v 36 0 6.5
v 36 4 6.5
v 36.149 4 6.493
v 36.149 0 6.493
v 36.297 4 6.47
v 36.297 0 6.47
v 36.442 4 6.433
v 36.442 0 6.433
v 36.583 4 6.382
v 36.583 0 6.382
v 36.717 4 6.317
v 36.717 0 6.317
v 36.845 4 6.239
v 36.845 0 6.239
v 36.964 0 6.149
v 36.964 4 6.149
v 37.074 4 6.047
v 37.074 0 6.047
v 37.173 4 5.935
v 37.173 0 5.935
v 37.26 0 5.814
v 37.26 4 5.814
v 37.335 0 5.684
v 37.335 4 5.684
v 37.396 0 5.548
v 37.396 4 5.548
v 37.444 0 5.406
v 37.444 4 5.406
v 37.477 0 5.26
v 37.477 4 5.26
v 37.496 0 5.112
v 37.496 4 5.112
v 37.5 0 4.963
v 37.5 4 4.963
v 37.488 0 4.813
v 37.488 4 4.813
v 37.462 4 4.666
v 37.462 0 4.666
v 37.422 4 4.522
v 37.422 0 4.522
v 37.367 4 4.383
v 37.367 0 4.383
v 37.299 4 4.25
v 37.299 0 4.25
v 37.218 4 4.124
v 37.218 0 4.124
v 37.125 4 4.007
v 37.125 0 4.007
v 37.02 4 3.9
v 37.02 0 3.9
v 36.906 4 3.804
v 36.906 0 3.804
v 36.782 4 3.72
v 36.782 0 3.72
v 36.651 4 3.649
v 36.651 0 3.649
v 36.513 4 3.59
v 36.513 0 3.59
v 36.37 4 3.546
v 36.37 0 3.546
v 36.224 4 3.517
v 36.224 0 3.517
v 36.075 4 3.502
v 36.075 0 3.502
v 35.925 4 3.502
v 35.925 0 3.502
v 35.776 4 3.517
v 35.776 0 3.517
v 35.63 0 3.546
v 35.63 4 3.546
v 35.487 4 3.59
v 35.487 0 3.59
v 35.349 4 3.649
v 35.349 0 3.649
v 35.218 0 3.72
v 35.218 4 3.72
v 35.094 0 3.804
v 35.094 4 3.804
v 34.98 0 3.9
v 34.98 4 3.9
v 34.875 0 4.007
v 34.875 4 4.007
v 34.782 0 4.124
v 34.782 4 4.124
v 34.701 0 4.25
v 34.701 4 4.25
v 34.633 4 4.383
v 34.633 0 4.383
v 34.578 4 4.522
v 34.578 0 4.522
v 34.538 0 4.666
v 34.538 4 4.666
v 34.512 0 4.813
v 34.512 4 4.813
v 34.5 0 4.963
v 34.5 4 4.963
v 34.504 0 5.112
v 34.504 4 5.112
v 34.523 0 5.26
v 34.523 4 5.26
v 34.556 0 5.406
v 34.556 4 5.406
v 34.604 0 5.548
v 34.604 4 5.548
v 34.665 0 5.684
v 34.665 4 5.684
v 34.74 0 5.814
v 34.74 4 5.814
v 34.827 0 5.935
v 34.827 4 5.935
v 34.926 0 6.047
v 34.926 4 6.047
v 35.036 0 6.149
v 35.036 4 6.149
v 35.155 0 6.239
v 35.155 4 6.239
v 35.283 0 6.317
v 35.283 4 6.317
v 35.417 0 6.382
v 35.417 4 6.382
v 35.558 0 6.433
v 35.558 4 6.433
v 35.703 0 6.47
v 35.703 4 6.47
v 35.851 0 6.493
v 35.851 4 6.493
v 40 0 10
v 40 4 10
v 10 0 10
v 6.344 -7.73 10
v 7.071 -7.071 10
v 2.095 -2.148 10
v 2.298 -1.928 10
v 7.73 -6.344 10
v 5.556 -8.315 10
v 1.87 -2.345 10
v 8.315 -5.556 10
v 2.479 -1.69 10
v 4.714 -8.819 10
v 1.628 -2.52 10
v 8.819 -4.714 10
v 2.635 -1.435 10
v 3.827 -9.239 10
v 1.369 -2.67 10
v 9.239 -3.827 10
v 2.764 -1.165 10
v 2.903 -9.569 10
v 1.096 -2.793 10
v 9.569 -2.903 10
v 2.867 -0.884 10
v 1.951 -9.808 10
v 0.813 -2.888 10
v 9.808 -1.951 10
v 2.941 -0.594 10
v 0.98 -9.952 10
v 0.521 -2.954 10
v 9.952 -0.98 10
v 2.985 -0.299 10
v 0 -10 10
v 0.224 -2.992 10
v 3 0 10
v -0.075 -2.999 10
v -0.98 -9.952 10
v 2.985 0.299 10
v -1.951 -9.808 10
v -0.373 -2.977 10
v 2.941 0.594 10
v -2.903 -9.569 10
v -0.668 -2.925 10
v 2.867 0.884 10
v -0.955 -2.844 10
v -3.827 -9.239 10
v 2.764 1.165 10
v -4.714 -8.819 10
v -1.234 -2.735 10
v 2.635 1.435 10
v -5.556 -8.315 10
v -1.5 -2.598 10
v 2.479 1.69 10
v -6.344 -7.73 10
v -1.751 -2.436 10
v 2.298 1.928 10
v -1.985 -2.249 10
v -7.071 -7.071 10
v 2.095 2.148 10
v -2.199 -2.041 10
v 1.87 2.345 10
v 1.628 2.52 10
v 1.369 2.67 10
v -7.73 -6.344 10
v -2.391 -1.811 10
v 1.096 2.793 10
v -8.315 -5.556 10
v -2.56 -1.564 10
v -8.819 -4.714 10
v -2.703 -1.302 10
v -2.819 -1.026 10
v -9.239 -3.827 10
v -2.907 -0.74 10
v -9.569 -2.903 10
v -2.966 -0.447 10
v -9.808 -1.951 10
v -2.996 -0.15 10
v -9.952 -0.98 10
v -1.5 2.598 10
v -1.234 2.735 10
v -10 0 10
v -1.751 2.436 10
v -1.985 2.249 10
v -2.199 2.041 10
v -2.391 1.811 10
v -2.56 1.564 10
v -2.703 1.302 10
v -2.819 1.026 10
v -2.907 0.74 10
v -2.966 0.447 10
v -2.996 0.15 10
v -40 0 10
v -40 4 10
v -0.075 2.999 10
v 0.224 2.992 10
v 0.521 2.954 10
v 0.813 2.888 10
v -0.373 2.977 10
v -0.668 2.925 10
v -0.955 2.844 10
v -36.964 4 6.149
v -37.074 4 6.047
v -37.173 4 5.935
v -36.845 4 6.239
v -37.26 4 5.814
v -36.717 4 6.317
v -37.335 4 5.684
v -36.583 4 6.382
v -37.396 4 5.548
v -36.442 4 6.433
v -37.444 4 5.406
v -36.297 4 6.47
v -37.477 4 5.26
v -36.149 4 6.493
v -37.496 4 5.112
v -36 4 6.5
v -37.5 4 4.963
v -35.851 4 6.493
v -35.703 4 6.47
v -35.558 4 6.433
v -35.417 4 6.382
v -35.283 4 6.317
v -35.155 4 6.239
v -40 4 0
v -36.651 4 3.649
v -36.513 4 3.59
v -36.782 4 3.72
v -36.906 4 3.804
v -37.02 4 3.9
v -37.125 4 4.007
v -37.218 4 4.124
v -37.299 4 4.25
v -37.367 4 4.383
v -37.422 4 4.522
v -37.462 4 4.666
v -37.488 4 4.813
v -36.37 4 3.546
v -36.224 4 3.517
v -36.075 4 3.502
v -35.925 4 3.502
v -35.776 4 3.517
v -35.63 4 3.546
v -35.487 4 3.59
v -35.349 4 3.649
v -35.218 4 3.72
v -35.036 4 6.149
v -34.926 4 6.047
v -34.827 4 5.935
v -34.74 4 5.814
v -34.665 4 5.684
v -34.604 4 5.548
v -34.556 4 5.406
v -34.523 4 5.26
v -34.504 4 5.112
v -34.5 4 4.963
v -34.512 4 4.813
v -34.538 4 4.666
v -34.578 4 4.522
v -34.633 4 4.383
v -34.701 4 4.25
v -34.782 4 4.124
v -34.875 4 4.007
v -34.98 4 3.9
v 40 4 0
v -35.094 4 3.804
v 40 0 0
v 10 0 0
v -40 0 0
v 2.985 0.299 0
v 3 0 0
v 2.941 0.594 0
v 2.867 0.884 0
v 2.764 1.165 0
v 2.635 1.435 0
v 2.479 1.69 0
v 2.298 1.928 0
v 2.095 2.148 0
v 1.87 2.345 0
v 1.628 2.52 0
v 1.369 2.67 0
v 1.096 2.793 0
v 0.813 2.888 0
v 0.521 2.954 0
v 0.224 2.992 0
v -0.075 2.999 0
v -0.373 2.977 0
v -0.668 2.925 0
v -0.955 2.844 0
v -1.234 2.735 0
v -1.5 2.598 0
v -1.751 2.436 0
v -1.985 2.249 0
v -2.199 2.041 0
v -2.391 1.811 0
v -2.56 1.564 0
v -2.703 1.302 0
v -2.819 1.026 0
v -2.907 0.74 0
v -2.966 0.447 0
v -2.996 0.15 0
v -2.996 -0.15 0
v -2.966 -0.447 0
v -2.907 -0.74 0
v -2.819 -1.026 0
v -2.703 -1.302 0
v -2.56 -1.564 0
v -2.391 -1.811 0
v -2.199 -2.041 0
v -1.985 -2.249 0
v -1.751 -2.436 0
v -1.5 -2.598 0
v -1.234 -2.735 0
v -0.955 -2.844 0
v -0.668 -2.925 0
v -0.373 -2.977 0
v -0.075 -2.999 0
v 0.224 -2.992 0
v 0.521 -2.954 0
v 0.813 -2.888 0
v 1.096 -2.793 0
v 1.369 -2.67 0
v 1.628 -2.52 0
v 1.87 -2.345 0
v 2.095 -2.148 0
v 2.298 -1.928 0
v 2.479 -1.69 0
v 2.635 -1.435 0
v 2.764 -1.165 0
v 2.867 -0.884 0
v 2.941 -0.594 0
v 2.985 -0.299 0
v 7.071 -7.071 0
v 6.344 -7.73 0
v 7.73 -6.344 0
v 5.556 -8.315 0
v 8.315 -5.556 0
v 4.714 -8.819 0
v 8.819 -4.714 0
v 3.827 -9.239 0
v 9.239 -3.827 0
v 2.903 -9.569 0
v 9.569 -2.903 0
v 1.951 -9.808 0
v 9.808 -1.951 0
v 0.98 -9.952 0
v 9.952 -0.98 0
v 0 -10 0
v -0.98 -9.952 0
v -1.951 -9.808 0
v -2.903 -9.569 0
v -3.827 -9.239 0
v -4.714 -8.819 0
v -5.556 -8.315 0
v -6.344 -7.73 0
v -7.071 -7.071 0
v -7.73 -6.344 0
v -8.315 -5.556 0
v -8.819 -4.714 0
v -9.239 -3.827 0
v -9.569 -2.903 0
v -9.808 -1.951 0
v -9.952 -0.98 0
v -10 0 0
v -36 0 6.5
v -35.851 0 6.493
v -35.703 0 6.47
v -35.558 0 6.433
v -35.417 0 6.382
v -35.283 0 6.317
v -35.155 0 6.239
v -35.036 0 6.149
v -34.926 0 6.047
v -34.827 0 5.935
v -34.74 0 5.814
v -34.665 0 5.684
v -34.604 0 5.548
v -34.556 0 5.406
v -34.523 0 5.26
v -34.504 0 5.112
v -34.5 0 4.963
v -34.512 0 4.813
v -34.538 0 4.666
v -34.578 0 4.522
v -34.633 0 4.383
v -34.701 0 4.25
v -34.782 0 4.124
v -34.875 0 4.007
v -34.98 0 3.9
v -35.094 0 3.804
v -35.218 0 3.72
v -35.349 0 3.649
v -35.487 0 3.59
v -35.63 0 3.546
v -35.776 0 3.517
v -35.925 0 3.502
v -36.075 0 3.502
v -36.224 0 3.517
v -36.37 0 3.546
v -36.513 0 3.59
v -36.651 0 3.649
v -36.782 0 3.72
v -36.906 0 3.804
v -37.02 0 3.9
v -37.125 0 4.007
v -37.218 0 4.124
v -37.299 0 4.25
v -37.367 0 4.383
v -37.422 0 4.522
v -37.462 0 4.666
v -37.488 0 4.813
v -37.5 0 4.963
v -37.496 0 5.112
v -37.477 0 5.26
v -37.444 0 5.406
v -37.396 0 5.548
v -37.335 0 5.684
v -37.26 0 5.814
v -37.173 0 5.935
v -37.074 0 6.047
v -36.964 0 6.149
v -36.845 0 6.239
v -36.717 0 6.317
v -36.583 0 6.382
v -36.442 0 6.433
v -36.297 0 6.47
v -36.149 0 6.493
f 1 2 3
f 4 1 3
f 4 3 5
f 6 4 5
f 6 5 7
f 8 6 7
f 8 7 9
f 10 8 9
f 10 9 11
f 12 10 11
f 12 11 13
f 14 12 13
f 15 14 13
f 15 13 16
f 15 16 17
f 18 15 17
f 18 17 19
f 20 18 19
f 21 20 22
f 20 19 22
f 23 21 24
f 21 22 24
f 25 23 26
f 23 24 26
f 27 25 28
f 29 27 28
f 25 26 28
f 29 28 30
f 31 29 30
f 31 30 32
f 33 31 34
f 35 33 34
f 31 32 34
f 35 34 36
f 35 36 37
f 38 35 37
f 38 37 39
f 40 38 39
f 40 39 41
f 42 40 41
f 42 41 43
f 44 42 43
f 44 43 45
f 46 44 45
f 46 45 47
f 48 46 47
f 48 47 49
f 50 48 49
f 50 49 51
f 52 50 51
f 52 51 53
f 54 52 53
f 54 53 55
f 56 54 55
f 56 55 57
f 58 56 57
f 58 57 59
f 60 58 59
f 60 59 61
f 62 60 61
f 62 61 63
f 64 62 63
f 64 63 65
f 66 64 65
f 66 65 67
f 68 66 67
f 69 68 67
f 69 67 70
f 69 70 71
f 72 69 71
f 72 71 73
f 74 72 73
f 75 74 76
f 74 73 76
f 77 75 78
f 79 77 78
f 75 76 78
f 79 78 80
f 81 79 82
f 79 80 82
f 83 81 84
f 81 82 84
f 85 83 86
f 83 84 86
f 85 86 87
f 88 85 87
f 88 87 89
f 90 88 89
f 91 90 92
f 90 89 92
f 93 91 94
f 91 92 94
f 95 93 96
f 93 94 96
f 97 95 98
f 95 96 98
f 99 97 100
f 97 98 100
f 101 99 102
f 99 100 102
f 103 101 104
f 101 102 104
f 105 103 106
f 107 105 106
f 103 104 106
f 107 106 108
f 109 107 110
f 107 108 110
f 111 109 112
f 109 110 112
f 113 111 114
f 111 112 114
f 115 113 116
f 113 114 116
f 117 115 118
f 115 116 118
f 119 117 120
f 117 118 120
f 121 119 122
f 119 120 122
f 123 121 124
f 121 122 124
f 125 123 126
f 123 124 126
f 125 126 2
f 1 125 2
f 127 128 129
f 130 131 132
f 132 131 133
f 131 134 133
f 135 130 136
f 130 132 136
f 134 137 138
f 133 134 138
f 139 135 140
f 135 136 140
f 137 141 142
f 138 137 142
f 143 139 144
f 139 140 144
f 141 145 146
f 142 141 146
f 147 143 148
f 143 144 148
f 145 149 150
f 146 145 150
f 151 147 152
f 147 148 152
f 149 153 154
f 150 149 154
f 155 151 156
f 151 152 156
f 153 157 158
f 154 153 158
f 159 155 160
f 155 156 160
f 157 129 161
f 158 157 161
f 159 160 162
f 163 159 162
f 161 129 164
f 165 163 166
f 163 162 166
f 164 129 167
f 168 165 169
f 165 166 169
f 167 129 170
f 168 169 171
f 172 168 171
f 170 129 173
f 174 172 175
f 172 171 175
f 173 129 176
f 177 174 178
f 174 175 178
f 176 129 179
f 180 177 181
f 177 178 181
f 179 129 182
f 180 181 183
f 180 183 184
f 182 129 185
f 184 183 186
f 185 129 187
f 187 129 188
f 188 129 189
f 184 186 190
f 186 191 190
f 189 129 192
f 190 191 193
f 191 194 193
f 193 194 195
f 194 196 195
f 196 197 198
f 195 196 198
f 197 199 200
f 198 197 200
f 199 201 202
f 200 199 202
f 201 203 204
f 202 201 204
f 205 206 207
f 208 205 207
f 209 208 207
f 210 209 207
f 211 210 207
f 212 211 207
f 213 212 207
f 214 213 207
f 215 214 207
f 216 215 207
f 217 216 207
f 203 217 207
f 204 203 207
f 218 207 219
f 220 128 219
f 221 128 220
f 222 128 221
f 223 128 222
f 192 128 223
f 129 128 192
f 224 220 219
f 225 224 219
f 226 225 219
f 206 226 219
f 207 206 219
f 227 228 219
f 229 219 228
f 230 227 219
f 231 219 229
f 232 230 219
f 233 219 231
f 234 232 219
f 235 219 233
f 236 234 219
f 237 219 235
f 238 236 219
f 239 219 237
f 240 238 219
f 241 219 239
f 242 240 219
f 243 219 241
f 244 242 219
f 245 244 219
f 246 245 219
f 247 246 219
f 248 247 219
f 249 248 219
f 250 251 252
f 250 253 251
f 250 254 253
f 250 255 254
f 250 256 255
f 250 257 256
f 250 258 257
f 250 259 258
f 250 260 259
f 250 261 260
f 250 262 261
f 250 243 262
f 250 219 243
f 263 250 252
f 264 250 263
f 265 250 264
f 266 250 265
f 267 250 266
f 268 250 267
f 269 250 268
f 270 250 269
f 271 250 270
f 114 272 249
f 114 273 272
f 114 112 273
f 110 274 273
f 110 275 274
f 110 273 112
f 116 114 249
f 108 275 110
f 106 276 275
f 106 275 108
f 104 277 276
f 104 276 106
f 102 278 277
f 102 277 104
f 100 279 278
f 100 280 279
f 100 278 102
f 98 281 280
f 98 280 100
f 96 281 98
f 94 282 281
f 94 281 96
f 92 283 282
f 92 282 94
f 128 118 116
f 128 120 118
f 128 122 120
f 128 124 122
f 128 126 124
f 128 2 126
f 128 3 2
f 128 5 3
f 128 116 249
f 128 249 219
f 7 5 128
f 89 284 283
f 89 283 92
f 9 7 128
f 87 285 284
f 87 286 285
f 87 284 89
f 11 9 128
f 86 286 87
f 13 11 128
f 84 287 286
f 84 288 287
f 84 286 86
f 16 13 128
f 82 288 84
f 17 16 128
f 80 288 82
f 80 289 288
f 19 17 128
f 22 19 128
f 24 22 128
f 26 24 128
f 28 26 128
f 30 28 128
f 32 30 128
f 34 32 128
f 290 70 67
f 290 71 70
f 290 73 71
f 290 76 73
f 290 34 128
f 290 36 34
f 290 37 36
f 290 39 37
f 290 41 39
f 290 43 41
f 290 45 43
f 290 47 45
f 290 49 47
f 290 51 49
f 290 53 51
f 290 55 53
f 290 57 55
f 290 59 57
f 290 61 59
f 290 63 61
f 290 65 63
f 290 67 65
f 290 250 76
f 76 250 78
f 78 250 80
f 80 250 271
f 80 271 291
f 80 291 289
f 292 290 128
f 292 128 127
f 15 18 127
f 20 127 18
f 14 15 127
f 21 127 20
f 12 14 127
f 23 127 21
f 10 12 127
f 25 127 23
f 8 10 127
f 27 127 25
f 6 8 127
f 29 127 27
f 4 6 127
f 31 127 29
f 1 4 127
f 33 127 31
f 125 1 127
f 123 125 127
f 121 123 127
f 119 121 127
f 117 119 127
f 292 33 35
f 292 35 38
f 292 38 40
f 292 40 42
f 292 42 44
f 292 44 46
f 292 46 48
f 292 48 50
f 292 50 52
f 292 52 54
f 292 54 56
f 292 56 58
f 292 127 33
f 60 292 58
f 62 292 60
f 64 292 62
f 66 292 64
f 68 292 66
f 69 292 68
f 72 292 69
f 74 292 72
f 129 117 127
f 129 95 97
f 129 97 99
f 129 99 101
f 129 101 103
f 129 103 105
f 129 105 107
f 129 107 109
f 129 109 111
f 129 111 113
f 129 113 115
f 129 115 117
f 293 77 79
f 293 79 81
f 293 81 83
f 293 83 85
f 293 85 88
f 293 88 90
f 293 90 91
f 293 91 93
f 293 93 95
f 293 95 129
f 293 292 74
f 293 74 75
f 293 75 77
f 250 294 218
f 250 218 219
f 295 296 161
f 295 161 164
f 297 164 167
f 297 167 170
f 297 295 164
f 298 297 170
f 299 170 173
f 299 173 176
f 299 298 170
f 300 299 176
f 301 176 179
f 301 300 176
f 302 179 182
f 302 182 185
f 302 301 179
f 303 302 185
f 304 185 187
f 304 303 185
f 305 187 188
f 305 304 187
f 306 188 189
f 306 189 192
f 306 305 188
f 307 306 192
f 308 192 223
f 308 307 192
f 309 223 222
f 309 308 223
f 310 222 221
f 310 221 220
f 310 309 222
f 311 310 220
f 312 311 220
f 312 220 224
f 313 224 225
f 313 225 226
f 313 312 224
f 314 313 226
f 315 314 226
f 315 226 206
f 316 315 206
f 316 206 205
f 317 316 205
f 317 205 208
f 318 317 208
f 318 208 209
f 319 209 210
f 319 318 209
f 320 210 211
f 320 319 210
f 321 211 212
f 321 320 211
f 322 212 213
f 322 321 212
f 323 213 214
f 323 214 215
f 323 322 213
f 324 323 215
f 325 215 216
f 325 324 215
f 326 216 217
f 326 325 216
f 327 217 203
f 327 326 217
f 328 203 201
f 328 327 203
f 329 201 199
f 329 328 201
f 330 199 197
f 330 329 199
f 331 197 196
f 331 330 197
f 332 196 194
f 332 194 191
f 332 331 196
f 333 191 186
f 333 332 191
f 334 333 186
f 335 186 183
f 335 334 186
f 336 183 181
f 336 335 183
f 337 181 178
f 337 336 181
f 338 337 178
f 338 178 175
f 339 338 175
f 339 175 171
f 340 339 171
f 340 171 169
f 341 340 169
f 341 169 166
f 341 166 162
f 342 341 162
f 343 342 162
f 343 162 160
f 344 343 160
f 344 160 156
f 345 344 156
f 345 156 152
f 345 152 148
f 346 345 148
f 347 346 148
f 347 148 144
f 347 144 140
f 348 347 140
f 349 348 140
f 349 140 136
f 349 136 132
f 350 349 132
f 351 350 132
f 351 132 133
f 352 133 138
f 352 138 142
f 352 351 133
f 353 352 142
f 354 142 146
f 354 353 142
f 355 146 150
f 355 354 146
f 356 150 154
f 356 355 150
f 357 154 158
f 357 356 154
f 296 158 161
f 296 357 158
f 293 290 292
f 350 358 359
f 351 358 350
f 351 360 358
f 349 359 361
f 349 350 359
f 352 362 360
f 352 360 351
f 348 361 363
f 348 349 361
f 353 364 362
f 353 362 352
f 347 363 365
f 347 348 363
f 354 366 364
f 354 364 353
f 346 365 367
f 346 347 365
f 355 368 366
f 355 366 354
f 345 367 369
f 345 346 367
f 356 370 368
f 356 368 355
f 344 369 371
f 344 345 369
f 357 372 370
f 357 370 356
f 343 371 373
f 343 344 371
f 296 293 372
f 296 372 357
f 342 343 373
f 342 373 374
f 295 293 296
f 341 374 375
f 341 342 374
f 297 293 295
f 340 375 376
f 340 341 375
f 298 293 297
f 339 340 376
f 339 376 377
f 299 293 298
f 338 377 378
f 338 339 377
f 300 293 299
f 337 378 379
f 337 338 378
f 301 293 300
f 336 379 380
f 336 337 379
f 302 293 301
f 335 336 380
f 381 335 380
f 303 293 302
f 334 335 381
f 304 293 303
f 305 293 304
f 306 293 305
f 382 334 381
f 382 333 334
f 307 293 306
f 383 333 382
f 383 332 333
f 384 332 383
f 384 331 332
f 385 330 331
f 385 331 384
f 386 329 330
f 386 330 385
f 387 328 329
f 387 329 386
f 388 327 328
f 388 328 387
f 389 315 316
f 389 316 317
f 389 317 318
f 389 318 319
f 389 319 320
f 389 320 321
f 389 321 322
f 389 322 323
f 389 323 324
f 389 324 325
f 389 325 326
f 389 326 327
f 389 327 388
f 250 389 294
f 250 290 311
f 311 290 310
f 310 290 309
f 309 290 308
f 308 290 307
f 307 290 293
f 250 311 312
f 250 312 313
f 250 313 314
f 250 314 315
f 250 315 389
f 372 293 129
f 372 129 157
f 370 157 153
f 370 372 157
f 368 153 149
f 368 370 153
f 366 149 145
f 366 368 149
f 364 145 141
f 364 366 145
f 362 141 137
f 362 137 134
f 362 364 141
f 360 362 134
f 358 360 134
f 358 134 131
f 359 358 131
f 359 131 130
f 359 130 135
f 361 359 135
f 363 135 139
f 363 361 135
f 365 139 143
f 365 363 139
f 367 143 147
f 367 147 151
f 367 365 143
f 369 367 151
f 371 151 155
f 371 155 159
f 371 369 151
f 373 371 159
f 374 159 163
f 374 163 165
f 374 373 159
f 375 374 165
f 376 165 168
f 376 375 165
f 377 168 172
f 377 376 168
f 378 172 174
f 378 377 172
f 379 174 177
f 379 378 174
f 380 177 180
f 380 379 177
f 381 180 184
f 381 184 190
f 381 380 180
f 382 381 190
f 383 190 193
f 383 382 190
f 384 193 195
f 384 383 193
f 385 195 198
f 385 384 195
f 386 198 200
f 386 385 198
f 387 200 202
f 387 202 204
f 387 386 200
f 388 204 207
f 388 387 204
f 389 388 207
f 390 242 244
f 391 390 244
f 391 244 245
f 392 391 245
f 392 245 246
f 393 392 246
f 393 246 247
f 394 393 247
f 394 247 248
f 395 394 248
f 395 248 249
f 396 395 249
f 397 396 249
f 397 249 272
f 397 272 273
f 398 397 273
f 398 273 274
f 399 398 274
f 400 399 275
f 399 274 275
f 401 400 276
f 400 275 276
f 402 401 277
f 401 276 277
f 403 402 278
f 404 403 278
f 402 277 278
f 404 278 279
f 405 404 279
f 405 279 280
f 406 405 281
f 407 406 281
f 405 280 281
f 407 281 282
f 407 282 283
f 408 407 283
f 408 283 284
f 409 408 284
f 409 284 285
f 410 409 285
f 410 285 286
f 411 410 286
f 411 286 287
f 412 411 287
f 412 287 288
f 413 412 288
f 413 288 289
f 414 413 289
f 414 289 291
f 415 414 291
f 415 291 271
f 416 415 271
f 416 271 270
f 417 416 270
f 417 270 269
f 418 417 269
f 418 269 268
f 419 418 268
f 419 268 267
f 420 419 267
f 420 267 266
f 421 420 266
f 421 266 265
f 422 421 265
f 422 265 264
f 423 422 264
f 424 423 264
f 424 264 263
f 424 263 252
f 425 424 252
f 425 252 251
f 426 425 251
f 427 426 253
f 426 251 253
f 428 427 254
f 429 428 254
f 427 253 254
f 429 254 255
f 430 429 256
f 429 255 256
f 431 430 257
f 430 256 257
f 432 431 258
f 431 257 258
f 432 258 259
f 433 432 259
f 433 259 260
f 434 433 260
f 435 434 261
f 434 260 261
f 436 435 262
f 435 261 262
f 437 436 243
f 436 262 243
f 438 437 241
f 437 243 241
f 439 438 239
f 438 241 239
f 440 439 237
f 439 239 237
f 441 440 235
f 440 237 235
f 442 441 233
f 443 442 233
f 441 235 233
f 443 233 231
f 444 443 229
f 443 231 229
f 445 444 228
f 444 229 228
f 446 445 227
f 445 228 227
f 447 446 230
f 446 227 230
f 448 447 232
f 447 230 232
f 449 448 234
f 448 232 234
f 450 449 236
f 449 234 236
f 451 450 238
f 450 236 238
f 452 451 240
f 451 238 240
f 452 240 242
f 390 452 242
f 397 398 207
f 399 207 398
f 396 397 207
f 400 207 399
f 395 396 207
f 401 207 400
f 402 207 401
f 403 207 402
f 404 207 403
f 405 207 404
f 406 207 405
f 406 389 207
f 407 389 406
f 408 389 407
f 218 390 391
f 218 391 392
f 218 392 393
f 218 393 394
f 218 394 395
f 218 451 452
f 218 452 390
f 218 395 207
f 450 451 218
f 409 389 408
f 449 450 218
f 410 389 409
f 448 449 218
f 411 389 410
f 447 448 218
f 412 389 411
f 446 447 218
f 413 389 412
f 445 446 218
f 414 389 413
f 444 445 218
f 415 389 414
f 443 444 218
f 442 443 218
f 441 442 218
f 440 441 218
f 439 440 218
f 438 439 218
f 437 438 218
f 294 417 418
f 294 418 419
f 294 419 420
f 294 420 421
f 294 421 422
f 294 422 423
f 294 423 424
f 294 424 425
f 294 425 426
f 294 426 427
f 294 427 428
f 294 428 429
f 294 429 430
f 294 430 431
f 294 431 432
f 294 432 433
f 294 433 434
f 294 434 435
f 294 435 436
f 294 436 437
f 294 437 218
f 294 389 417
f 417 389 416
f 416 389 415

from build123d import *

# Parameters (mm, degrees)
ESQUISSE1_R             = 3
BOSS_EXTRU_1_DEPTH      = 10
ESQUISSE2_R             = 1.5
ENL_V_MAT_EXTRU_1_DEPTH = 44.543082114


with BuildPart() as part:
    # Esquisse1 → Boss.-Extru.1 (new body)
    with BuildSketch(Plane.XY):
        with BuildLine():
            Line((-10, 0), (-40, 0))
            Line((-40, 0), (-40, 4))
            Line((-40, 4), (40, 4))
            Line((40, 4), (40, 0))
            Line((40, 0), (10, 0))
            ThreePointArc((10, 0), (0, -10), (-10, 0))
        make_face()
        Circle(ESQUISSE1_R, mode=Mode.SUBTRACT)
    extrude(amount=BOSS_EXTRU_1_DEPTH)

    # Esquisse2 → Enlèv. mat.-Extru.1 (cut, through all)
    with BuildSketch(Plane(origin=(0, 4, 0), x_dir=(1, 0, 0), z_dir=(0, 1, 0))):
        with Locations(Location((-36, -5, 0), (0, 0, 270))):
            Circle(ESQUISSE2_R)
        with Locations(Location((36, -5, 0), (0, 0, 270))):
            Circle(ESQUISSE2_R)
    extrude(amount=-ENL_V_MAT_EXTRU_1_DEPTH, mode=Mode.SUBTRACT)


solid = part.part
